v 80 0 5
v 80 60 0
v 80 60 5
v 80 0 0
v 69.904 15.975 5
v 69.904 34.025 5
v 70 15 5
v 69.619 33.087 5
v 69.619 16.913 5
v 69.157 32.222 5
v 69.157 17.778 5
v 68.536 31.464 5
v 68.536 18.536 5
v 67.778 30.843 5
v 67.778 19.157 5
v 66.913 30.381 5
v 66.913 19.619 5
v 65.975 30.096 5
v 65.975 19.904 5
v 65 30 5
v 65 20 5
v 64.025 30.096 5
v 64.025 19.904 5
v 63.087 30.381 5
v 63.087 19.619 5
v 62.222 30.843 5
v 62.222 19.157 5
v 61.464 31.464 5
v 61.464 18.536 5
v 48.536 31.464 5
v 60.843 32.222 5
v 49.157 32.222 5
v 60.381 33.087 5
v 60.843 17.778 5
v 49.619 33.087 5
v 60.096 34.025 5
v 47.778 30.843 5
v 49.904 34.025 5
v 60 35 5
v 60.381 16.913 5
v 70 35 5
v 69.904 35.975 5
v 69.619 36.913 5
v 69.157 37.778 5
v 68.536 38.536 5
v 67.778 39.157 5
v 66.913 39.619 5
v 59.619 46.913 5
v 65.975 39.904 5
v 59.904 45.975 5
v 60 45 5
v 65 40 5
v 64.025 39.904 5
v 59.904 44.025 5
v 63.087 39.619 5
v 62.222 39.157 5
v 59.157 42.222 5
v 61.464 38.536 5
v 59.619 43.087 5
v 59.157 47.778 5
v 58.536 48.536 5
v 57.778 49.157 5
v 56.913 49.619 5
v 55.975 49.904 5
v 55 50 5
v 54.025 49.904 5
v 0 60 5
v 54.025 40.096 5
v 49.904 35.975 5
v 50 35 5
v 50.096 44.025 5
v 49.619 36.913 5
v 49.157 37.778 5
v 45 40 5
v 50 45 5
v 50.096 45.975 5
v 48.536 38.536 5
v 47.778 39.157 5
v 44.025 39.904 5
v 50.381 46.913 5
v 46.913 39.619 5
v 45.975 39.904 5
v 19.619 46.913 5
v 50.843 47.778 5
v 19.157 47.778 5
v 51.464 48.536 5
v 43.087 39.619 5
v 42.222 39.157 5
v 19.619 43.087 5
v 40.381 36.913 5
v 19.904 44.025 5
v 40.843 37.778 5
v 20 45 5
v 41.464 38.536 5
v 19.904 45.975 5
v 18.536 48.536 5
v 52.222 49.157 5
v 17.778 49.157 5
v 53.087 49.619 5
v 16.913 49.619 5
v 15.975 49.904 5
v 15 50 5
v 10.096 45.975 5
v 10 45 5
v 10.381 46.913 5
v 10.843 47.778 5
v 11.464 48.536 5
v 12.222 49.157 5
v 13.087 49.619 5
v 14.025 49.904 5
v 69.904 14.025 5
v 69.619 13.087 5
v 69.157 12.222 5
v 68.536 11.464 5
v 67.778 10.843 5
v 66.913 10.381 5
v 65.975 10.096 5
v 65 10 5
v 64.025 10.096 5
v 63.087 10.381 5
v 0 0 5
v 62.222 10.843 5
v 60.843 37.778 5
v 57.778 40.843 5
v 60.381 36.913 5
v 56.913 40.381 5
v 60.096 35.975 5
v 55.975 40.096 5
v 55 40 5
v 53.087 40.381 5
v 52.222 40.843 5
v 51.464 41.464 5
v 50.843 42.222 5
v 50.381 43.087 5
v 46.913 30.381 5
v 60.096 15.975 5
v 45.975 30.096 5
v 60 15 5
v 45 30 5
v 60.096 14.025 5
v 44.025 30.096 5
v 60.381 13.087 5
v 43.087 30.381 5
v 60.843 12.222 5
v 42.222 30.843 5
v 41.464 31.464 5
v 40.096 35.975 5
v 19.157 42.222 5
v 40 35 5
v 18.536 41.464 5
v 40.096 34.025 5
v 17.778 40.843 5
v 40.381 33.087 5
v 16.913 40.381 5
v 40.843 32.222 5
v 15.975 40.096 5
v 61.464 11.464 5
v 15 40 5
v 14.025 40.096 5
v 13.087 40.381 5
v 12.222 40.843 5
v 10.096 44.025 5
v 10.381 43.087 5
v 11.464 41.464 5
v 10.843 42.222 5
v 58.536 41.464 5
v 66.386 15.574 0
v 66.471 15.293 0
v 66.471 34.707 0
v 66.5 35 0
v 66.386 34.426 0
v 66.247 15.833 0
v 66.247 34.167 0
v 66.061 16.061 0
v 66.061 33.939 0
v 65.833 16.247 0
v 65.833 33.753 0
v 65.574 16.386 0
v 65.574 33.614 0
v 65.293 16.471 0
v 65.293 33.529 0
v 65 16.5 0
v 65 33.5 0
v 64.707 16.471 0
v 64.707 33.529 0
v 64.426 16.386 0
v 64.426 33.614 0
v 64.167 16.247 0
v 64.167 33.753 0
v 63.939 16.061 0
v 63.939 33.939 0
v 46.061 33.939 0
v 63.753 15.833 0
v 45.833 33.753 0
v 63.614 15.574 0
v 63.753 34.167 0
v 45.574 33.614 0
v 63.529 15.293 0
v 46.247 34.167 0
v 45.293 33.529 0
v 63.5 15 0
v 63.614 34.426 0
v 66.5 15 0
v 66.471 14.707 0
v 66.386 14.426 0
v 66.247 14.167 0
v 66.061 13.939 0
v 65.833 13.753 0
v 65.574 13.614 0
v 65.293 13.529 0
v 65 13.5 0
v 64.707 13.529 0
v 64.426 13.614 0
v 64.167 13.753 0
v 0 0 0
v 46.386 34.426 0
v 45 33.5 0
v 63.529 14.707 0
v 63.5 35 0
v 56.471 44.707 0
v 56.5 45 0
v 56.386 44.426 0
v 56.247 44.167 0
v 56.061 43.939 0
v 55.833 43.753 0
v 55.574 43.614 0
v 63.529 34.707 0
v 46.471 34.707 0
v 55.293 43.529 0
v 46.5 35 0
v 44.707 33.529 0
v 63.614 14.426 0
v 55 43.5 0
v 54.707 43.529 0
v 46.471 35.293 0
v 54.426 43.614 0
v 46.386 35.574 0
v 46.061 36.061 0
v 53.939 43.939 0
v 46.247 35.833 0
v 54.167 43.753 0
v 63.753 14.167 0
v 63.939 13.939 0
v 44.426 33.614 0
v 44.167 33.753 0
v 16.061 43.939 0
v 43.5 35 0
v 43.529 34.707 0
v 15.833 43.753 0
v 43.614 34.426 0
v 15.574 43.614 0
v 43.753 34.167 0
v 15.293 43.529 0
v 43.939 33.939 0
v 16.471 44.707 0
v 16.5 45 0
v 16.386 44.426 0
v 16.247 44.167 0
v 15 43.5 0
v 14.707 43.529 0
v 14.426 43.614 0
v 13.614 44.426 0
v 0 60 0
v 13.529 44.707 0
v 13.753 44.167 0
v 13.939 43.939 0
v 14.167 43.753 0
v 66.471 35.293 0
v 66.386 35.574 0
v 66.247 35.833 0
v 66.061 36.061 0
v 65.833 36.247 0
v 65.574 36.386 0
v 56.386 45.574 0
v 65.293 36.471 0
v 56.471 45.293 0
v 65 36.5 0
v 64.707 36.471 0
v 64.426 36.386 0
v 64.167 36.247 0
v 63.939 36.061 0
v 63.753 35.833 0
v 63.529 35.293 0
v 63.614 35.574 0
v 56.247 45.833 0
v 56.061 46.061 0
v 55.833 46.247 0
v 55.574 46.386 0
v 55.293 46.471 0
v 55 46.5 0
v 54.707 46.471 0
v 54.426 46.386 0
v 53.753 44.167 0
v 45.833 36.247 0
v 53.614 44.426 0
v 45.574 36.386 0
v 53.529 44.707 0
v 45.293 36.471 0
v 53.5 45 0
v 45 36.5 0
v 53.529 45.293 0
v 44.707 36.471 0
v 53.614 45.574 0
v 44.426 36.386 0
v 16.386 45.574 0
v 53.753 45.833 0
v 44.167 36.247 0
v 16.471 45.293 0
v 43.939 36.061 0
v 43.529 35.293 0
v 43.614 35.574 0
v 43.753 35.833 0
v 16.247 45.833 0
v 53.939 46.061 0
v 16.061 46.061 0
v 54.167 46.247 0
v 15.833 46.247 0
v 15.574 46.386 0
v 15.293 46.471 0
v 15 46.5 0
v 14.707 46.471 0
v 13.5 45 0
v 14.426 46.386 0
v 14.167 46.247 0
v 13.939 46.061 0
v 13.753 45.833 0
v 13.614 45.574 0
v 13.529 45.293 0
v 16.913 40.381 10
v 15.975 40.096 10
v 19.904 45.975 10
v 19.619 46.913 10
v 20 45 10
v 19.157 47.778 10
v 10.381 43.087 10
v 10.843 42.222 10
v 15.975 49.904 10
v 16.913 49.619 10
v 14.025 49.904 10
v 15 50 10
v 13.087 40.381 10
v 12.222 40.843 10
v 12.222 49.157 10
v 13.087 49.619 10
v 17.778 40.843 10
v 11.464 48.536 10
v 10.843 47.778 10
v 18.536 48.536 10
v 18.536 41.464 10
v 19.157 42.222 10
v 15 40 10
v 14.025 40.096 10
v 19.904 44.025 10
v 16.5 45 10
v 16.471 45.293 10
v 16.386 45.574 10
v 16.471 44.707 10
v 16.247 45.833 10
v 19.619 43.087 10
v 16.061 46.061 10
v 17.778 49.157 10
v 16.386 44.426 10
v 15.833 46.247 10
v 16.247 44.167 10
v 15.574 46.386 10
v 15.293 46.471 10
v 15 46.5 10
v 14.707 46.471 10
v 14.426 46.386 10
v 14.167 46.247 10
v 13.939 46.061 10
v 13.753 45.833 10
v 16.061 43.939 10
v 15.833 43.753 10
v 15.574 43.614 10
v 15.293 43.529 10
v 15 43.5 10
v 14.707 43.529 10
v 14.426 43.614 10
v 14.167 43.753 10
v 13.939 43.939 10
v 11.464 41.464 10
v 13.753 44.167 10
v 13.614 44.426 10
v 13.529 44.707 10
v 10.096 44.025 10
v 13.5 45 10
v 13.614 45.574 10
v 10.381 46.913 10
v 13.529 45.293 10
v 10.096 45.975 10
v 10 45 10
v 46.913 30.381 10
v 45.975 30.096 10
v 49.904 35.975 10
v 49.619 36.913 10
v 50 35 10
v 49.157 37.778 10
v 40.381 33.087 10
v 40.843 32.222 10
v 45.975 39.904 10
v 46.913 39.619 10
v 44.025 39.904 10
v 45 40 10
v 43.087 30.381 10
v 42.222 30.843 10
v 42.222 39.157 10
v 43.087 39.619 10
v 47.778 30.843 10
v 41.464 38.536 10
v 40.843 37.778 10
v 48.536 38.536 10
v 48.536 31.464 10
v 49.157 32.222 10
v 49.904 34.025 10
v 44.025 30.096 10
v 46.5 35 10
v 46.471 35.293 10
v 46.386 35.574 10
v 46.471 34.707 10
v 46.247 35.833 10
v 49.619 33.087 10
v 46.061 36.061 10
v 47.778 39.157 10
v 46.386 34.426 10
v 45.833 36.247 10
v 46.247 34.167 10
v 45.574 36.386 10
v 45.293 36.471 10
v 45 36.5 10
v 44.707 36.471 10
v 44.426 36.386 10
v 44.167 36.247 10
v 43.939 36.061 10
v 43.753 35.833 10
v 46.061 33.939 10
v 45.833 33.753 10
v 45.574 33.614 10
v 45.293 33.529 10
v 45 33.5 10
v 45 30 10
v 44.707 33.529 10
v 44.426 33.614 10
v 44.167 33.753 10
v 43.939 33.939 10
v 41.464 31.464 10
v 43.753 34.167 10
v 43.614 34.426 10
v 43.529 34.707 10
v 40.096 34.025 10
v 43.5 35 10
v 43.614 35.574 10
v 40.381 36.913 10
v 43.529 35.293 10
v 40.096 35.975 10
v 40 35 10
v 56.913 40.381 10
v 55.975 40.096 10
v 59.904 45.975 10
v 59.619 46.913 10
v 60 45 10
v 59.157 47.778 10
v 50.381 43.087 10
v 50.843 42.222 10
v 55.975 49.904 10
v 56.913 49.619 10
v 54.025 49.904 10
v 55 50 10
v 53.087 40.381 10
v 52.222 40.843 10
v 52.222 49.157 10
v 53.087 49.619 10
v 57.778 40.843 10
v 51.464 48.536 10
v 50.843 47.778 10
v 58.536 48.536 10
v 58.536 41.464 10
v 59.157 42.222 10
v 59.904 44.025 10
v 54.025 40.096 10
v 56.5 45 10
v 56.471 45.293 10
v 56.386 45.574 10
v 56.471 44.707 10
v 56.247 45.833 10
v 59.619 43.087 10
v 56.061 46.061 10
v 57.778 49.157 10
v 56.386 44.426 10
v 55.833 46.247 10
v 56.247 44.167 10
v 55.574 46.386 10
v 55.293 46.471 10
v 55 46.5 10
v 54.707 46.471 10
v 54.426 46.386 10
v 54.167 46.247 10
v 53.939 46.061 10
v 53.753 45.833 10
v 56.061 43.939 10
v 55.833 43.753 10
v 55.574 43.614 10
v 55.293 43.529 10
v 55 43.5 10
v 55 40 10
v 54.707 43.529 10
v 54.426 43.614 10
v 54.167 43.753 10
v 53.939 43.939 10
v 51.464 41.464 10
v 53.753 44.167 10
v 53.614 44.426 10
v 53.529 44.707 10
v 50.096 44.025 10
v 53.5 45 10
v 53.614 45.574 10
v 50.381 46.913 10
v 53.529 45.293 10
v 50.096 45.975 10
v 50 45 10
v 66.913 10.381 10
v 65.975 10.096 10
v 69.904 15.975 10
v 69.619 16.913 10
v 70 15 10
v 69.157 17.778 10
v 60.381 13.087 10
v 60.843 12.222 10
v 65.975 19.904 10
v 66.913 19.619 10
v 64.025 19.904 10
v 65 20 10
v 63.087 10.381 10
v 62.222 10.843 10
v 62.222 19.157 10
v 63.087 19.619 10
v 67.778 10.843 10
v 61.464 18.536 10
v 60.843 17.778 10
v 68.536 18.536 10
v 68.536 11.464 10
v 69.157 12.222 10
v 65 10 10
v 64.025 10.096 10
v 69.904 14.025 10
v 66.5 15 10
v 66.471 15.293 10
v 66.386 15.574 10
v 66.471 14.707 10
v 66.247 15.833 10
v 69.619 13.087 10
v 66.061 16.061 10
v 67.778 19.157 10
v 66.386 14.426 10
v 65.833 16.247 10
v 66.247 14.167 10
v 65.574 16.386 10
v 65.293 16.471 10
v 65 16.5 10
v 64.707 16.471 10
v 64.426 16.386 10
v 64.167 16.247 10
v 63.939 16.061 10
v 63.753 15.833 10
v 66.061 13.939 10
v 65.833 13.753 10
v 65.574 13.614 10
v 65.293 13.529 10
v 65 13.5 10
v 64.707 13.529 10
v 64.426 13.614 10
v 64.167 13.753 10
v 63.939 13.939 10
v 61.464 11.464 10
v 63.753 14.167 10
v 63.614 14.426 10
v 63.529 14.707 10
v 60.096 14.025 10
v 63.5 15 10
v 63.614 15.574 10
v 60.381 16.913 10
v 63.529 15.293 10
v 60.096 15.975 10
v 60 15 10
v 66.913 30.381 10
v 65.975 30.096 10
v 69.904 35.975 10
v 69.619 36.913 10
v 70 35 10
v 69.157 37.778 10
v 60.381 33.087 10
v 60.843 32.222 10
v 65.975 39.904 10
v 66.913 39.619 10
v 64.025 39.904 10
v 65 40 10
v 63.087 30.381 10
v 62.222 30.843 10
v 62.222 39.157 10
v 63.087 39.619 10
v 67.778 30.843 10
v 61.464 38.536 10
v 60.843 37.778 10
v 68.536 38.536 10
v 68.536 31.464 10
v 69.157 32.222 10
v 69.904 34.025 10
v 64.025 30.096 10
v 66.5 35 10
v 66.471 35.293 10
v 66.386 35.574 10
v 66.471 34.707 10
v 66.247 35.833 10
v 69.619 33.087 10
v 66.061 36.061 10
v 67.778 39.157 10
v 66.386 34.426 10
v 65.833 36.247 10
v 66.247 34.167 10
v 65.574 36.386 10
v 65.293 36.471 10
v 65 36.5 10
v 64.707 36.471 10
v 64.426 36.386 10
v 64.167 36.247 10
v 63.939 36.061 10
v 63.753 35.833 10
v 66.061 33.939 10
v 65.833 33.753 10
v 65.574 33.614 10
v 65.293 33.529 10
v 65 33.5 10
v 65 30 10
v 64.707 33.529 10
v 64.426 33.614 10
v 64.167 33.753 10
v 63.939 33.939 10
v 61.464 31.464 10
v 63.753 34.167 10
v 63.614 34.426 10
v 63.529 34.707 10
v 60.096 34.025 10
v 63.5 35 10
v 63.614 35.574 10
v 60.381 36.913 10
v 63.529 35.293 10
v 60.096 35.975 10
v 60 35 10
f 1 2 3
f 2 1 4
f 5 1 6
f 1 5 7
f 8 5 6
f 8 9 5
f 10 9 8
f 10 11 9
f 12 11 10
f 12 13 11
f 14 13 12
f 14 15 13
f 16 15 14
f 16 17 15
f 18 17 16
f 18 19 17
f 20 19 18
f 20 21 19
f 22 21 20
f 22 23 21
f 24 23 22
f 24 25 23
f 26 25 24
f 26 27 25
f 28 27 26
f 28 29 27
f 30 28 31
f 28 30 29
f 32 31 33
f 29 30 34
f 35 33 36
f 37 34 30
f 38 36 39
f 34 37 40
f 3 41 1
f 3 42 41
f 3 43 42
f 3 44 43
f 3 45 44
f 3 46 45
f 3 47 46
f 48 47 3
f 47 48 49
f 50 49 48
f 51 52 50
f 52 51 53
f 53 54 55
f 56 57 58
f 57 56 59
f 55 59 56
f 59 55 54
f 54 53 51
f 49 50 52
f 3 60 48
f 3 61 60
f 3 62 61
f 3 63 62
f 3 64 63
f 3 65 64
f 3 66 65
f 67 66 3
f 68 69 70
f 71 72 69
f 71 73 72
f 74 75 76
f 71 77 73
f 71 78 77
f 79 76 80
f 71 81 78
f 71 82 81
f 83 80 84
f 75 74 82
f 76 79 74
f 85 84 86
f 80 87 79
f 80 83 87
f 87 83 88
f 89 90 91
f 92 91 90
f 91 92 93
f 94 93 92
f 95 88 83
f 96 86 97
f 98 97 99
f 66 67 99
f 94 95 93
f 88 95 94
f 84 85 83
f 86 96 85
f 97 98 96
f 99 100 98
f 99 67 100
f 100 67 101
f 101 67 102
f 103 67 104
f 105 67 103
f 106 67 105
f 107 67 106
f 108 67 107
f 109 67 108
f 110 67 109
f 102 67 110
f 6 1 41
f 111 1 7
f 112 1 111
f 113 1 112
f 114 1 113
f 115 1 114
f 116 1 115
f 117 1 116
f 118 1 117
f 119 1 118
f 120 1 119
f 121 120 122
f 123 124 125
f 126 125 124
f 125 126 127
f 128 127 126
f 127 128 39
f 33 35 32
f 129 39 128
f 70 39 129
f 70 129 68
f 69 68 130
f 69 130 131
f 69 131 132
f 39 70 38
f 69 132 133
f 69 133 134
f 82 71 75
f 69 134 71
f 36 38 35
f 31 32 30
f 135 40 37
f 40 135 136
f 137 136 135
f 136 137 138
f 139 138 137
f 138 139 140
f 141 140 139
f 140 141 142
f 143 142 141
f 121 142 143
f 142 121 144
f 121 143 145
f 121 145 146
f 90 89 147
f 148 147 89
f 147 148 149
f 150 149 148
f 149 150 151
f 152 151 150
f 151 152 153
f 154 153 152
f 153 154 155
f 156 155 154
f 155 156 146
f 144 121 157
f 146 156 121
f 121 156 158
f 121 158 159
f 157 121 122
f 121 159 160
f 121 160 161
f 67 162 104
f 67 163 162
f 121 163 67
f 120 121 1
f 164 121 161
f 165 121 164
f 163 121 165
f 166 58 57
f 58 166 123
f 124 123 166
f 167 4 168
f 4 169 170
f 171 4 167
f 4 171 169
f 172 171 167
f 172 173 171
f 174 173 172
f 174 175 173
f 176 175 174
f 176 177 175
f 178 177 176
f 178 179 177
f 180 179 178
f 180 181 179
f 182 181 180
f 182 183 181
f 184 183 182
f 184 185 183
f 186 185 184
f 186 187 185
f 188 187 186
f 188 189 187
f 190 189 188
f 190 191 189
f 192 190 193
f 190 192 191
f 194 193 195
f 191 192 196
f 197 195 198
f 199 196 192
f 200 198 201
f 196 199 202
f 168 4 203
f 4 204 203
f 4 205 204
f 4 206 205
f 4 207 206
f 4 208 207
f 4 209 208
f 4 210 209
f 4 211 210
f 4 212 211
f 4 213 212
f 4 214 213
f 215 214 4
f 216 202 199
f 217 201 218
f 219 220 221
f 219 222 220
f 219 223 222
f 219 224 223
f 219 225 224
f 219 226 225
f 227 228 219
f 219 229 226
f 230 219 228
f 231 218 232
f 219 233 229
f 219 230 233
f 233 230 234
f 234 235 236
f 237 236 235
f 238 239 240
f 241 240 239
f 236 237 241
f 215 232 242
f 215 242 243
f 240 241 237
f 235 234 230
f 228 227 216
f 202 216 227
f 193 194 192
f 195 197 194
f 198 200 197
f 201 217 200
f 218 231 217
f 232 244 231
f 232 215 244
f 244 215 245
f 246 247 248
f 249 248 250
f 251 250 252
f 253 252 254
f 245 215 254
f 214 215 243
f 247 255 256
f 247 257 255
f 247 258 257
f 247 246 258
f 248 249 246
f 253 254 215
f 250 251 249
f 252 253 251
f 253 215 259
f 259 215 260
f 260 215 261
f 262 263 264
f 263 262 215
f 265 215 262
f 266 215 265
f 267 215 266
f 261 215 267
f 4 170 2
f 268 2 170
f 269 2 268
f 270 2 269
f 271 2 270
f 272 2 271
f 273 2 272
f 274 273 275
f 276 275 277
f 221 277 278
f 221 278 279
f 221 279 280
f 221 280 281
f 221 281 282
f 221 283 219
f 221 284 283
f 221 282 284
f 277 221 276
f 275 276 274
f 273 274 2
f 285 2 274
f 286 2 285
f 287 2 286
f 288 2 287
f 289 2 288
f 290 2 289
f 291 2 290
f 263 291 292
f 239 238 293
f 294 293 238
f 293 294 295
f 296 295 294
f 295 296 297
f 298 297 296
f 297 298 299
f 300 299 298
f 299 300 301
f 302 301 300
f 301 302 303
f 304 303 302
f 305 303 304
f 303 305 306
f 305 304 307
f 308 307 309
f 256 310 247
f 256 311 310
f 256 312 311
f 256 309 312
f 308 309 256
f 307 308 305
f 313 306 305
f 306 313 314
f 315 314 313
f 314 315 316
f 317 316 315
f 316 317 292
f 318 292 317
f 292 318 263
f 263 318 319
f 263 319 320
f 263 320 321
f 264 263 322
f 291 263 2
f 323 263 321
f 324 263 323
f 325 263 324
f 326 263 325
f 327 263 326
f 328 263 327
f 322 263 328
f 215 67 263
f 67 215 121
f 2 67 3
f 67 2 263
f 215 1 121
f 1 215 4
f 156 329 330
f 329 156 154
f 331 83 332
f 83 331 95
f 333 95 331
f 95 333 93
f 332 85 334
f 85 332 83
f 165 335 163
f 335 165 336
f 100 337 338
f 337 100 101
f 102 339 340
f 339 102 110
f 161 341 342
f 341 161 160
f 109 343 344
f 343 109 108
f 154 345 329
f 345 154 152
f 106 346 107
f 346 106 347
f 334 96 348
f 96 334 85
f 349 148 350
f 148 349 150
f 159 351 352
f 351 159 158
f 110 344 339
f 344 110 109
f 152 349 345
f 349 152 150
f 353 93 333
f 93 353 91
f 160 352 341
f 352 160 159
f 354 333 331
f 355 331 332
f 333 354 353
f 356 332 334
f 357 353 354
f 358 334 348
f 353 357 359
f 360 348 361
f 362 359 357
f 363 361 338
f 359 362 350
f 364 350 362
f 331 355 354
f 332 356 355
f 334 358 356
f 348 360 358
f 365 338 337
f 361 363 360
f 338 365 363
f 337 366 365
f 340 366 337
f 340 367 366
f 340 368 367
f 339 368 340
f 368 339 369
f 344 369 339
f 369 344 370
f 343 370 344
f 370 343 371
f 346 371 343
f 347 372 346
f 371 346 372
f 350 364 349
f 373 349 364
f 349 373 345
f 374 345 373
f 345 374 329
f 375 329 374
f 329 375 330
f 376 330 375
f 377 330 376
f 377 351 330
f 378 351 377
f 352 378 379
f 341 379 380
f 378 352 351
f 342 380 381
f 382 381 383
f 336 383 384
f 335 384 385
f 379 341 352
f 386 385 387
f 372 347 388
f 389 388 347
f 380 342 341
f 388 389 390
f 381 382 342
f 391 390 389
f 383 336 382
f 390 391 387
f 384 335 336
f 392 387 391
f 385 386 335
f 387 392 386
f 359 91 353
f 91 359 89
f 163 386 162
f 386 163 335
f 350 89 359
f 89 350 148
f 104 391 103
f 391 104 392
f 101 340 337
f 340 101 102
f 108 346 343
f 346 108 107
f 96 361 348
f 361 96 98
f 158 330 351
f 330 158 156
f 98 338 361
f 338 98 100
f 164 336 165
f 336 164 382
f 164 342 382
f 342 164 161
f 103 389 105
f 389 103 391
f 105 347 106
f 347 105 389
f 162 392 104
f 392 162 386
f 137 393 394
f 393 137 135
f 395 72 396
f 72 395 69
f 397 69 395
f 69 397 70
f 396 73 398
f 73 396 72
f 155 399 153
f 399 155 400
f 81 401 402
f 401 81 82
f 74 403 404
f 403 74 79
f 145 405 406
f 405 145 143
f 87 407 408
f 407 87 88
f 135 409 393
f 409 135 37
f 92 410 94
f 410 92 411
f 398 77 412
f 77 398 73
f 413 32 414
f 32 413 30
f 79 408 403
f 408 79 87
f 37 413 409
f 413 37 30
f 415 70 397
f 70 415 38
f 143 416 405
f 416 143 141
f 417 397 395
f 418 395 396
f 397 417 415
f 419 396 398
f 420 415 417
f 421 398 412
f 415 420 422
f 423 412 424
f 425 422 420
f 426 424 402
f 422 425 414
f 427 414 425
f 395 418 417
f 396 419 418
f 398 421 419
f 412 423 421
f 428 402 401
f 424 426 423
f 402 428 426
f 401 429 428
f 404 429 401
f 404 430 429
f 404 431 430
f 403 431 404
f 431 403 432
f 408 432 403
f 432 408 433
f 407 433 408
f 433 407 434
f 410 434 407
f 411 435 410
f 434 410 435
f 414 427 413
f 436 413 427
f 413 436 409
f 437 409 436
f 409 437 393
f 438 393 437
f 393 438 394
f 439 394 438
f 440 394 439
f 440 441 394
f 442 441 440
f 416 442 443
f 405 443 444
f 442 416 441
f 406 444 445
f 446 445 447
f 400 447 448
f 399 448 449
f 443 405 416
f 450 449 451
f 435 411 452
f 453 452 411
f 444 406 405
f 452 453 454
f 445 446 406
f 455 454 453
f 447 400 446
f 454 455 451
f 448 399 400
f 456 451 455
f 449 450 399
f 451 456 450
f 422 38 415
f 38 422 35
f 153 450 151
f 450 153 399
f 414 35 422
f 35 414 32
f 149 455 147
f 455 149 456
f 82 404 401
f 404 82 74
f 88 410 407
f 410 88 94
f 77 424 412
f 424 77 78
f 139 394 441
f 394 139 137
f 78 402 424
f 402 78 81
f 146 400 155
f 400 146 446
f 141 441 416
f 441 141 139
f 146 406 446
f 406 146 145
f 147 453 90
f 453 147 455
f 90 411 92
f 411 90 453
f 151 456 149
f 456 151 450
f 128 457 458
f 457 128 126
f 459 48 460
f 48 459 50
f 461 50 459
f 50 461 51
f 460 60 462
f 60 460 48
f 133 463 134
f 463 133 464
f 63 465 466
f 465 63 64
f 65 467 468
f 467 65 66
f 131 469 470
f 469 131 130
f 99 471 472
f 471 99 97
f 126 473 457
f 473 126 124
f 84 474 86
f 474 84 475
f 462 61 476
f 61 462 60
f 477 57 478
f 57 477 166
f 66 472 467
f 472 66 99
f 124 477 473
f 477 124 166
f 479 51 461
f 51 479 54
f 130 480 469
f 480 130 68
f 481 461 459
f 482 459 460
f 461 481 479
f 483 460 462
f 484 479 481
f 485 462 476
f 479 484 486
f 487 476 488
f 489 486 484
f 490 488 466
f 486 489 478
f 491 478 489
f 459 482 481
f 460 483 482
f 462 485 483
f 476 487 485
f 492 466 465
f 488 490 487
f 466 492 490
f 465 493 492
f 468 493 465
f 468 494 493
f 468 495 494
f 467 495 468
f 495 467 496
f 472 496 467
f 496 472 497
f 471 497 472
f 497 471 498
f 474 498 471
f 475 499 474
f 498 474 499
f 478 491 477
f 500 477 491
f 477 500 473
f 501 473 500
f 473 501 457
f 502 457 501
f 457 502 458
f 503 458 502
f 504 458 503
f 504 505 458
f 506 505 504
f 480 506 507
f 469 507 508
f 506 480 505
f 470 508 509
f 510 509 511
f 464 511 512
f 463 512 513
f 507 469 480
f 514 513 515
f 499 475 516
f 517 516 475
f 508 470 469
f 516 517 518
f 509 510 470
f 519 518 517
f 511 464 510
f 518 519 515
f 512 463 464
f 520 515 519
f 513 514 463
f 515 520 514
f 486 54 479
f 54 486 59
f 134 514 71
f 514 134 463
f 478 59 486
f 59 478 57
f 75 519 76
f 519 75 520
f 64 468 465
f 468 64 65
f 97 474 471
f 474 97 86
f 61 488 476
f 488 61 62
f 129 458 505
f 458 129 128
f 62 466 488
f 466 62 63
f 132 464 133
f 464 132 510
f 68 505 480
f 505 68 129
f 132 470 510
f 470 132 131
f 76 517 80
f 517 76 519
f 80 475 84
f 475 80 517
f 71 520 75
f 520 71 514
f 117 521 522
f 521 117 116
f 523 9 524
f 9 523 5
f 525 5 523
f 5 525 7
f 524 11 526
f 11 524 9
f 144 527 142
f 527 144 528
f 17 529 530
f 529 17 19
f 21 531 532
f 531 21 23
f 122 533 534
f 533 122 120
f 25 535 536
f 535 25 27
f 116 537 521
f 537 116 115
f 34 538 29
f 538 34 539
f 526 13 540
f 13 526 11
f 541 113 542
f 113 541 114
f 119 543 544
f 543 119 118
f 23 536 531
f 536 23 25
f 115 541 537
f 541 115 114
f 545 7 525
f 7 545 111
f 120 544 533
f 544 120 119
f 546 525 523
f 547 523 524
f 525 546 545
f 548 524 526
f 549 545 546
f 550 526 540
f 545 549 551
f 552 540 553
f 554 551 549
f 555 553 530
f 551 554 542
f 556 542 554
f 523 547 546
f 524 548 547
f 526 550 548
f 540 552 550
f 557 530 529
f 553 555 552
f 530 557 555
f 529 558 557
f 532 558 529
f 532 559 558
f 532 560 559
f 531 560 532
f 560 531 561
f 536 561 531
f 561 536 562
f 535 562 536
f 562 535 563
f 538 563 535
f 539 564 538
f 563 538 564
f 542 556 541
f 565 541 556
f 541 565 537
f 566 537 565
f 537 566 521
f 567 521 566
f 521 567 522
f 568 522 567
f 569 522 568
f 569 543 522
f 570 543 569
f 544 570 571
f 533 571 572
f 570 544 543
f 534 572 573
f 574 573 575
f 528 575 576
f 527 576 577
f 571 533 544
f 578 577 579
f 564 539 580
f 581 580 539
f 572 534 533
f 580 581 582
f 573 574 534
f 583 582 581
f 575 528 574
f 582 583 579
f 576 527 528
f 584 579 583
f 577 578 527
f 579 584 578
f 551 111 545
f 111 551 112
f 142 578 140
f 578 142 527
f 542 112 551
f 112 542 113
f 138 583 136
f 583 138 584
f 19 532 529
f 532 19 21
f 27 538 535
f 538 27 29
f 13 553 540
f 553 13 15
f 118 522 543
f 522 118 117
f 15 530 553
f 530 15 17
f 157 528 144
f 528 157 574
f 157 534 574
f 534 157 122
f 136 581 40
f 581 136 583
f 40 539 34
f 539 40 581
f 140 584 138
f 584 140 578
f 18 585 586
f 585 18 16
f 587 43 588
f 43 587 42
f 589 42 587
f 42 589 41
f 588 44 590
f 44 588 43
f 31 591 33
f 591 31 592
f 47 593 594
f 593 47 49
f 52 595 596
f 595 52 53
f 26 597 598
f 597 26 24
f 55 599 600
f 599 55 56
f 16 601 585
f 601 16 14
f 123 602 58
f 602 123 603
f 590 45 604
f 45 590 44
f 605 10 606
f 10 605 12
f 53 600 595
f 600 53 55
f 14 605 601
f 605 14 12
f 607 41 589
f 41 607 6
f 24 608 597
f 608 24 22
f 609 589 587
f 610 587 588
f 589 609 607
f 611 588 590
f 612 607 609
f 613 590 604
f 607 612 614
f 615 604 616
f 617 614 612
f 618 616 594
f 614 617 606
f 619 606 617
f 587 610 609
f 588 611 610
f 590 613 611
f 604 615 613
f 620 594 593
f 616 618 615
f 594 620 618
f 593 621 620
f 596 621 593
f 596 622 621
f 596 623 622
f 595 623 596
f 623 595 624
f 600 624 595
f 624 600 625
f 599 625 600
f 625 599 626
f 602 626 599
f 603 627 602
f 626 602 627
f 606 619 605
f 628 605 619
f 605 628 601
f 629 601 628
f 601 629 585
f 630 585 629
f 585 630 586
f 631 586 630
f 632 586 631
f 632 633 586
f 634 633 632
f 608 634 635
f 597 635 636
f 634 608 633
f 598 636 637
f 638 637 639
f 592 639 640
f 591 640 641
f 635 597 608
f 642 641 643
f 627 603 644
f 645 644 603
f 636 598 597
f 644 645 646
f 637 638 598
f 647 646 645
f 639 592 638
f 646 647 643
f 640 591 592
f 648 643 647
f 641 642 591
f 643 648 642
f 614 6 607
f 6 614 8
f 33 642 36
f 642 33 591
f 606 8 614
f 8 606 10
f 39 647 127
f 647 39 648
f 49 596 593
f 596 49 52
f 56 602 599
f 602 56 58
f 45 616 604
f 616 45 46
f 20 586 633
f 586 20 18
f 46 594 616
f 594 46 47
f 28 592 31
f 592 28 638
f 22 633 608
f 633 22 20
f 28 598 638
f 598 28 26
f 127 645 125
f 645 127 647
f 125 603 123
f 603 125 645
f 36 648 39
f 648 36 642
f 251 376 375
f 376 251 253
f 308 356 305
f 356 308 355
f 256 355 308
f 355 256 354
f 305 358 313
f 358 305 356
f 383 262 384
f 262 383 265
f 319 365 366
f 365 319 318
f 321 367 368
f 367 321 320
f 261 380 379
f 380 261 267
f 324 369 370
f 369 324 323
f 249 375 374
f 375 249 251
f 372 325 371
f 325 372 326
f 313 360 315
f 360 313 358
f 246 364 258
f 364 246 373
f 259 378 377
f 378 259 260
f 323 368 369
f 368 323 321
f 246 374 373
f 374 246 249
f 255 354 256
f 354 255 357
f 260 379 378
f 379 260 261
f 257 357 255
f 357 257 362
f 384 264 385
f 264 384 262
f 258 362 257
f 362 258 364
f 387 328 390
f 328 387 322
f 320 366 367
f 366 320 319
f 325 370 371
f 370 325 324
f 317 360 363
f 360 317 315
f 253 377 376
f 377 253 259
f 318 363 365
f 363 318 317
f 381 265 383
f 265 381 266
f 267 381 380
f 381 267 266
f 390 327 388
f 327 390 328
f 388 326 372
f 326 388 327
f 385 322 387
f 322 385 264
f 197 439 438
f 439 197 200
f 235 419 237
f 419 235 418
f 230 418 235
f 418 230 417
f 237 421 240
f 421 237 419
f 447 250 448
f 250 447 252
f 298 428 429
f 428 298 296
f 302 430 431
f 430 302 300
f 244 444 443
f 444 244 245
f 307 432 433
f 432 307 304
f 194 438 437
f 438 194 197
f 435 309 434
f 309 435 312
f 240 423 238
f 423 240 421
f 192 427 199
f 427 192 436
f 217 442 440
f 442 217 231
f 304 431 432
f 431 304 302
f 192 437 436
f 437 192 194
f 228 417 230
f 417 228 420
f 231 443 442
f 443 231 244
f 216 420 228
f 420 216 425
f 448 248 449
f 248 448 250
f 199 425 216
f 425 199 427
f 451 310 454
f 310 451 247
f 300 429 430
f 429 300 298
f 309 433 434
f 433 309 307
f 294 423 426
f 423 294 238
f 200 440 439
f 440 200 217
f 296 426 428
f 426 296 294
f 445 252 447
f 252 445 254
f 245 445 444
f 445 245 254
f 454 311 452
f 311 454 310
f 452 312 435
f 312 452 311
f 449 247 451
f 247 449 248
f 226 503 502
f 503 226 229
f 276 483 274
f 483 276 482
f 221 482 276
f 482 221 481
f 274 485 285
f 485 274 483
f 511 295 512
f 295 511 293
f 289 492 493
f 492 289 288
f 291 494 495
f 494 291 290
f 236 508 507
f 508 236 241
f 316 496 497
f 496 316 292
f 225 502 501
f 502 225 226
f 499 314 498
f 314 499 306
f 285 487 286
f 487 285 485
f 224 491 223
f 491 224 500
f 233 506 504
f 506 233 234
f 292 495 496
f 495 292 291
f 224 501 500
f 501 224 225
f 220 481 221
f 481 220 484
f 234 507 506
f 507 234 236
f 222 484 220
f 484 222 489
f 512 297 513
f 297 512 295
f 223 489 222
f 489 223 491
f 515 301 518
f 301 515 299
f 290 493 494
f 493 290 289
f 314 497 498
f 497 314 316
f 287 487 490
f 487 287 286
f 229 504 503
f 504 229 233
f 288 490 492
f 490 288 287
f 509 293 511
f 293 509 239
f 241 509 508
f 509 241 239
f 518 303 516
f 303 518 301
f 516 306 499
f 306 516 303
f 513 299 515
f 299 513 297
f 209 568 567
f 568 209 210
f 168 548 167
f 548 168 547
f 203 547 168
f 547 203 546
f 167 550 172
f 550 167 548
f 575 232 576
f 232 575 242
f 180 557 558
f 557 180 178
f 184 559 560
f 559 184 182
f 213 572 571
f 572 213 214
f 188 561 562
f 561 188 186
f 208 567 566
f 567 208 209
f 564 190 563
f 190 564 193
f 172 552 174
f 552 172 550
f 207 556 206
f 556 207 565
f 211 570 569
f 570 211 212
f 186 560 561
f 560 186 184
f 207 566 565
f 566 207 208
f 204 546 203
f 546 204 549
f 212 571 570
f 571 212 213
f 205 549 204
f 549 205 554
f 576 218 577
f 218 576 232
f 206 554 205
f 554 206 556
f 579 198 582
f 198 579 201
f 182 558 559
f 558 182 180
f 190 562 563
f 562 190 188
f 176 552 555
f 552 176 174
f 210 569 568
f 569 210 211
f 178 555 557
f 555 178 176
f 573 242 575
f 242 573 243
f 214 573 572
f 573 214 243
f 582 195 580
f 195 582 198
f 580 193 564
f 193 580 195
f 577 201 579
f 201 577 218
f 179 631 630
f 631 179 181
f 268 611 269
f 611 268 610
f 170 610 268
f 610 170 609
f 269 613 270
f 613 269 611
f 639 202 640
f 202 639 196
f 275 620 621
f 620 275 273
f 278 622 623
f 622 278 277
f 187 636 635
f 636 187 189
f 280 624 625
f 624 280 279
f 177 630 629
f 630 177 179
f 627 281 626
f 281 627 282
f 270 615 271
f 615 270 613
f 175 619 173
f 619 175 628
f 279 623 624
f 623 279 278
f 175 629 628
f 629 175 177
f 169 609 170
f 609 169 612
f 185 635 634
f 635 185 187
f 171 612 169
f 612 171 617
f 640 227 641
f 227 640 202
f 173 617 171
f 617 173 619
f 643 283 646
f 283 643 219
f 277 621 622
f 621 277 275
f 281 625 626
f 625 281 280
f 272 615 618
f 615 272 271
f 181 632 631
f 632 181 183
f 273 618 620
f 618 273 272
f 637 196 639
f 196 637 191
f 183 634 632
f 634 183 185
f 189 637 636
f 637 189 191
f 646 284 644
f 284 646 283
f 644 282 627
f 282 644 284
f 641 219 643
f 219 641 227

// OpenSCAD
$fn = 32;

// ----------------------------------------------------------------------
// Boss field: plate with bosses at given coordinates
// ----------------------------------------------------------------------

// --- parameters (mm) ---
plate_l = 80;             // plate length, X
plate_w = 60;             // plate width, Y
plate_t = 5;              // plate thickness, Z
boss_d = 10;              // boss diameter
boss_h = 5;               // boss height above the plate
bore_d = 3;               // boss bore
fit_tol = 0.1;            // tolerance for press fits, mm
free_tol = 0.5;           // tolerance for clearance fits, mm

total_h = plate_t + boss_h;  // overall height

difference() {
  union() {
    cube([plate_l, plate_w, plate_t]);
    translate([15, 45, plate_t]) cylinder(h = boss_h, d = boss_d);
    translate([45, 35, plate_t]) cylinder(h = boss_h, d = boss_d);
    translate([55, 45, plate_t]) cylinder(h = boss_h, d = boss_d);
    translate([65, 15, plate_t]) cylinder(h = boss_h, d = boss_d);
    translate([65, 35, plate_t]) cylinder(h = boss_h, d = boss_d);
  }
  translate([15, 45, -1]) cylinder(h = total_h + 2, d = bore_d);
  translate([45, 35, -1]) cylinder(h = total_h + 2, d = bore_d);
  translate([55, 45, -1]) cylinder(h = total_h + 2, d = bore_d);
  translate([65, 15, -1]) cylinder(h = total_h + 2, d = bore_d);
  translate([65, 35, -1]) cylinder(h = total_h + 2, d = bore_d);
}
